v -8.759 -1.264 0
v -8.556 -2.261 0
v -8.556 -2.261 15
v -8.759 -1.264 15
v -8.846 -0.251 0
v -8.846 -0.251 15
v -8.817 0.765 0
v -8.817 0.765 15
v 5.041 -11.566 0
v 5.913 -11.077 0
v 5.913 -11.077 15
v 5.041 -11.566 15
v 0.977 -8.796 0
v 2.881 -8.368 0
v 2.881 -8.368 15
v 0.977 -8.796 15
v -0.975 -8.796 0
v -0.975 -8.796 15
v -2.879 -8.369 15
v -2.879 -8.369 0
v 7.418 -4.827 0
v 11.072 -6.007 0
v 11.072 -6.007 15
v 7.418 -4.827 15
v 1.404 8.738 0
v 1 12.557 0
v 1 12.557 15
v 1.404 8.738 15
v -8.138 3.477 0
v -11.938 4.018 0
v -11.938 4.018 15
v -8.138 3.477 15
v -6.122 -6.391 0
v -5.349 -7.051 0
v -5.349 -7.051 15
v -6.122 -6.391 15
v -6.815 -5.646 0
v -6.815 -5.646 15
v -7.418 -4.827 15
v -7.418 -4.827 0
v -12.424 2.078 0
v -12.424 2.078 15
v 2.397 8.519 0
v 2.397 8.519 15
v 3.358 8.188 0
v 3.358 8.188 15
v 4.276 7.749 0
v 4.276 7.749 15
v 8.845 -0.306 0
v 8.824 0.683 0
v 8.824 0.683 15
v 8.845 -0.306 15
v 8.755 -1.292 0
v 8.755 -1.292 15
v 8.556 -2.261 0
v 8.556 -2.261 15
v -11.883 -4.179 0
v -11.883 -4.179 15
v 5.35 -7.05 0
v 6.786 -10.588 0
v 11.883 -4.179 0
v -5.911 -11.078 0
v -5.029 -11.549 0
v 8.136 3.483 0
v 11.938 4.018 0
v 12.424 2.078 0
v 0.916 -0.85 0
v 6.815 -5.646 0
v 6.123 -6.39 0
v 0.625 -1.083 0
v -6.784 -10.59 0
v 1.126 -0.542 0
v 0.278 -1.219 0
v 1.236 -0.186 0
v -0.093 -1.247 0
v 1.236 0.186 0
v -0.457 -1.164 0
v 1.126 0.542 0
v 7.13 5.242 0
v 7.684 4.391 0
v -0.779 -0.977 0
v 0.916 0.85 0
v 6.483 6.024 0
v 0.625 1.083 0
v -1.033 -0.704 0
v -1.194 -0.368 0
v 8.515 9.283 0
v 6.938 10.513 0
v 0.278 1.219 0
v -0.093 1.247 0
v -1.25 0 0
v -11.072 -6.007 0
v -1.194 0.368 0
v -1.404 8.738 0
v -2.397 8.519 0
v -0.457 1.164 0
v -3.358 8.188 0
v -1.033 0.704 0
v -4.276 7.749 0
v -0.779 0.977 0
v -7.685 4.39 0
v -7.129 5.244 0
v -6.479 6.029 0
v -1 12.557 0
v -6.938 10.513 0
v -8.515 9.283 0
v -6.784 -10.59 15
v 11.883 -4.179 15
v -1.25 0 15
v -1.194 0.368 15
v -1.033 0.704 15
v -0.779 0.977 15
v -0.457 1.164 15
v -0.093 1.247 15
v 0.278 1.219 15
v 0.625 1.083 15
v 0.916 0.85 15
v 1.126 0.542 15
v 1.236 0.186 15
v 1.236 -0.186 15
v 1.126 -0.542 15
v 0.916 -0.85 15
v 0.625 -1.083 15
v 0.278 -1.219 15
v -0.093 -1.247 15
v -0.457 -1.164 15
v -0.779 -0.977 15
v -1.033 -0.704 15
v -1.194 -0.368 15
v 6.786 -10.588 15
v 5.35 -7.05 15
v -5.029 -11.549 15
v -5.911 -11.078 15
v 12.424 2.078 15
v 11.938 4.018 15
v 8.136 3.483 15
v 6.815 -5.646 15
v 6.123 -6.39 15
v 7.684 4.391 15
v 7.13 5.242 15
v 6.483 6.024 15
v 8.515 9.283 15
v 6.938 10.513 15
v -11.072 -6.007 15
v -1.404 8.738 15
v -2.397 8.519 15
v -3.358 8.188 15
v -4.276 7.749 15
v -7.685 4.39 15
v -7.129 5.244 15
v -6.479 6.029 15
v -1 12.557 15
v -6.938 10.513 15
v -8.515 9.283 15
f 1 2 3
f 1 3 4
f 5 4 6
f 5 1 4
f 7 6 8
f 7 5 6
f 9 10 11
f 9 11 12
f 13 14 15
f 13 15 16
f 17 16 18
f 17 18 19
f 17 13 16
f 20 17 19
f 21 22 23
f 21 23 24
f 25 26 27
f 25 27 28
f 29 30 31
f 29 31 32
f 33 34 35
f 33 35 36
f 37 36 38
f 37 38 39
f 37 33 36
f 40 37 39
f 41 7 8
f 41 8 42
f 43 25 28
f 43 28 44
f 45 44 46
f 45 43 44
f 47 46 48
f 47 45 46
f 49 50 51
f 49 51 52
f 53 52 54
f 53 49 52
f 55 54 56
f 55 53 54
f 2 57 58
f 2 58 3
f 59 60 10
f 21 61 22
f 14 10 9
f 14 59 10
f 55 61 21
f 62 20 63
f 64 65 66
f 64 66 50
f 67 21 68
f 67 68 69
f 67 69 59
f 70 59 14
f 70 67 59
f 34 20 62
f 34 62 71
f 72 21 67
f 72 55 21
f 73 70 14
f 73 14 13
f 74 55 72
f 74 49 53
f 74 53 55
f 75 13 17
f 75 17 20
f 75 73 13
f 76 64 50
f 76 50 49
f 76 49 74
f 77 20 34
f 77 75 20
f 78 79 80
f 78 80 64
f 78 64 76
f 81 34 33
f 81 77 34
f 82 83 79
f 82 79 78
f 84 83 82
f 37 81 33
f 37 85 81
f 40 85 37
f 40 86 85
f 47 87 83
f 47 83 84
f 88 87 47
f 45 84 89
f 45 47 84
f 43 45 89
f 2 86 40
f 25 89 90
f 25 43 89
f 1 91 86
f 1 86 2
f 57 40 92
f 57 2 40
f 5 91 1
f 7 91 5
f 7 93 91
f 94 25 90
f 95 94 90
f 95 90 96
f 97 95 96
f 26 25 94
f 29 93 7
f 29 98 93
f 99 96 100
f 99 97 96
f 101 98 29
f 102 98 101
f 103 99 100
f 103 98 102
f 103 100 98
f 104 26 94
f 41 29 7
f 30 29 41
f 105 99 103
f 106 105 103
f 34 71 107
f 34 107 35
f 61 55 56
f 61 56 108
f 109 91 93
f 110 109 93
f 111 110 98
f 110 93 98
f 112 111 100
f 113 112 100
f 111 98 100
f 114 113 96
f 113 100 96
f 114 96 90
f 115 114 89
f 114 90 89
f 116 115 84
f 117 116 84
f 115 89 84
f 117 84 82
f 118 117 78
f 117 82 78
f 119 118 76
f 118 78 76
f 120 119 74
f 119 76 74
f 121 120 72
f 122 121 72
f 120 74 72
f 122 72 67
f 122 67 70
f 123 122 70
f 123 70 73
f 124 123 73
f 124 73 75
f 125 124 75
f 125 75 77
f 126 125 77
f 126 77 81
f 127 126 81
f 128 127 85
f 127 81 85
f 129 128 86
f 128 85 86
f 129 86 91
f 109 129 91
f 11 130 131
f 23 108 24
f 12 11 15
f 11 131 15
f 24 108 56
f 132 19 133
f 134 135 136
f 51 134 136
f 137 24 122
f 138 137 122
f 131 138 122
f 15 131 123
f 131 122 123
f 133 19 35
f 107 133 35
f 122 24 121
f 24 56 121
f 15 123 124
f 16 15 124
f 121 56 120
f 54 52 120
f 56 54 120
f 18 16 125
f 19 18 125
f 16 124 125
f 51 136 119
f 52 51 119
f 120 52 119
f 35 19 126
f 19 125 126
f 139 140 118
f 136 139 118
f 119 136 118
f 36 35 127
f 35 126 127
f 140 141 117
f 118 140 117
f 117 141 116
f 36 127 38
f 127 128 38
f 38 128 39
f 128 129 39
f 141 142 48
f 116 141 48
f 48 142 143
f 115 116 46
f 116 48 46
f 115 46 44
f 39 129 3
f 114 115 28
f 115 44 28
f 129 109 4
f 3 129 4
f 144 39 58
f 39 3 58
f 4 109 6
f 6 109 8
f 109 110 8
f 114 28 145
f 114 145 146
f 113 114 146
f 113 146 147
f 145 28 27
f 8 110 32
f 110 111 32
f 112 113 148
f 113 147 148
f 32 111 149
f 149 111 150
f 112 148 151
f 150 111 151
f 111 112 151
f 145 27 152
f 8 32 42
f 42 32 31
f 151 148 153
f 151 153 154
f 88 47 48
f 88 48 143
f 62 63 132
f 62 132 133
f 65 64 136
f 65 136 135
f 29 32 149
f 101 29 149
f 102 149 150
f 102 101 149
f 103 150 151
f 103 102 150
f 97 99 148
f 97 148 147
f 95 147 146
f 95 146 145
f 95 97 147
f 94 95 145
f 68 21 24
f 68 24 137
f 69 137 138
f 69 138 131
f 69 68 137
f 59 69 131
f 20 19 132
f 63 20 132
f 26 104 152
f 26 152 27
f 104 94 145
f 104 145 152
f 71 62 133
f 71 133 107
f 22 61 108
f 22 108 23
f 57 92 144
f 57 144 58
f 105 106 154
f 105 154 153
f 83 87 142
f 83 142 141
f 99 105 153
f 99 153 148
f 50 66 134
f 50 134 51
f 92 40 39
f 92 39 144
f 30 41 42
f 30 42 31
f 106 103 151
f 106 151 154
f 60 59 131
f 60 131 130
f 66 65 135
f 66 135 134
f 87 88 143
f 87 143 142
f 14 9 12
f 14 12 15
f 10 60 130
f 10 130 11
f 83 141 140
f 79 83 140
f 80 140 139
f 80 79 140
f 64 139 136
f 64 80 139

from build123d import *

# Parameters (mm, degrees)
EXTRUDE_2_DEPTH     = 15
SKETCH_5_R          = 1.25
CUT_EXTRUDE_1_DEPTH = 15


with BuildPart() as part:
    # Эскиз3 → Бобышка-Вытянуть2 (new body)
    with BuildSketch(Plane.XY):
        with BuildLine():
            Line((-1, 12.556672608), (0, 12.556672608))
            Line((0, 12.556672608), (1, 12.556672608))
            Line((1, 12.556672608), (1.403768611, 8.737959355))
            ThreePointArc((1.403768611, 8.737959355), (2.882480289, 8.367425374), (4.275666751, 7.748623996))
            Line((4.275666751, 7.748623996), (6.938281237, 10.513338217))
            Line((6.938281237, 10.513338217), (8.514814211, 9.282670194))
            Line((8.514814211, 9.282670194), (6.483307331, 6.024053955))
            ThreePointArc((6.483307331, 6.024053955), (7.419229042, 4.824680344), (8.135910959, 3.482736406))
            Line((8.135910959, 3.482736406), (11.938429132, 4.017951822))
            Line((11.938429132, 4.017951822), (12.423885361, 2.077763107))
            Line((12.423885361, 2.077763107), (8.823580607, 0.683319303))
            ThreePointArc((8.823580607, 0.683319303), (8.813761391, -0.800068834), (8.556312106, -2.260978362))
            Line((8.556312106, -2.260978362), (11.88304599, -4.178904758))
            Line((11.88304599, -4.178904758), (11.071850771, -6.007008197))
            Line((11.071850771, -6.007008197), (7.417581711, -4.827212608))
            ThreePointArc((7.417581711, -4.827212608), (6.479864305, -6.027757343), (5.350154649, -7.049705329))
            Line((5.350154649, -7.049705329), (6.785807353, -10.588258594))
            Line((6.785807353, -10.588258594), (5.913418577, -11.077071262))
            Line((5.913418577, -11.077071262), (5.041029802, -11.565883931))
            Line((5.041029802, -11.565883931), (2.88053291, -8.36809597))
            ThreePointArc((2.88053291, -8.36809597), (0.000835422, -8.849999961), (-2.878952996, -8.368639653))
            Line((-2.878952996, -8.368639653), (-5.029072142, -11.548959277))
            Line((-5.029072142, -11.548959277), (-5.911327166, -11.078187493))
            Line((-5.911327166, -11.078187493), (-6.783800352, -10.589525504))
            Line((-6.783800352, -10.589525504), (-5.348823599, -7.050715291))
            ThreePointArc((-5.348823599, -7.050715291), (-6.479295244, -6.028369028), (-7.417581672, -4.827212668))
            Line((-7.417581672, -4.827212668), (-11.071850724, -6.007008285))
            Line((-11.071850724, -6.007008285), (-11.883045968, -4.178904821))
            Line((-11.883045968, -4.178904821), (-8.556312093, -2.260978407))
            ThreePointArc((-8.556312093, -2.260978407), (-8.817386806, -0.759071749), (-8.816843455, 0.765357101))
            Line((-8.816843455, 0.765357101), (-12.423885379, 2.077762999))
            Line((-12.423885379, 2.077762999), (-11.938429167, 4.017951718))
            Line((-11.938429167, 4.017951718), (-8.138356697, 3.477017439))
            ThreePointArc((-8.138356697, 3.477017439), (-7.419229073, 4.824680297), (-6.479071962, 6.028609003))
            Line((-6.479071962, 6.028609003), (-8.514814242, 9.282670165))
            Line((-8.514814242, 9.282670165), (-6.938281272, 10.513338193))
            Line((-6.938281272, 10.513338193), (-4.275666751, 7.748623996))
            ThreePointArc((-4.275666751, 7.748623996), (-2.882480289, 8.367425373), (-1.403768611, 8.737959355))
            Line((-1.403768611, 8.737959355), (-1, 12.556672608))
        make_face()
    extrude(amount=EXTRUDE_2_DEPTH)

    # Эскиз5 → Вырез-Вытянуть1 (cut)
    with BuildSketch(Plane(origin=(0, 0, 0), x_dir=(-1, 0, 0), z_dir=(0, 0, -1))):
        Circle(SKETCH_5_R)
    extrude(amount=-CUT_EXTRUDE_1_DEPTH, mode=Mode.SUBTRACT)


solid = part.part
